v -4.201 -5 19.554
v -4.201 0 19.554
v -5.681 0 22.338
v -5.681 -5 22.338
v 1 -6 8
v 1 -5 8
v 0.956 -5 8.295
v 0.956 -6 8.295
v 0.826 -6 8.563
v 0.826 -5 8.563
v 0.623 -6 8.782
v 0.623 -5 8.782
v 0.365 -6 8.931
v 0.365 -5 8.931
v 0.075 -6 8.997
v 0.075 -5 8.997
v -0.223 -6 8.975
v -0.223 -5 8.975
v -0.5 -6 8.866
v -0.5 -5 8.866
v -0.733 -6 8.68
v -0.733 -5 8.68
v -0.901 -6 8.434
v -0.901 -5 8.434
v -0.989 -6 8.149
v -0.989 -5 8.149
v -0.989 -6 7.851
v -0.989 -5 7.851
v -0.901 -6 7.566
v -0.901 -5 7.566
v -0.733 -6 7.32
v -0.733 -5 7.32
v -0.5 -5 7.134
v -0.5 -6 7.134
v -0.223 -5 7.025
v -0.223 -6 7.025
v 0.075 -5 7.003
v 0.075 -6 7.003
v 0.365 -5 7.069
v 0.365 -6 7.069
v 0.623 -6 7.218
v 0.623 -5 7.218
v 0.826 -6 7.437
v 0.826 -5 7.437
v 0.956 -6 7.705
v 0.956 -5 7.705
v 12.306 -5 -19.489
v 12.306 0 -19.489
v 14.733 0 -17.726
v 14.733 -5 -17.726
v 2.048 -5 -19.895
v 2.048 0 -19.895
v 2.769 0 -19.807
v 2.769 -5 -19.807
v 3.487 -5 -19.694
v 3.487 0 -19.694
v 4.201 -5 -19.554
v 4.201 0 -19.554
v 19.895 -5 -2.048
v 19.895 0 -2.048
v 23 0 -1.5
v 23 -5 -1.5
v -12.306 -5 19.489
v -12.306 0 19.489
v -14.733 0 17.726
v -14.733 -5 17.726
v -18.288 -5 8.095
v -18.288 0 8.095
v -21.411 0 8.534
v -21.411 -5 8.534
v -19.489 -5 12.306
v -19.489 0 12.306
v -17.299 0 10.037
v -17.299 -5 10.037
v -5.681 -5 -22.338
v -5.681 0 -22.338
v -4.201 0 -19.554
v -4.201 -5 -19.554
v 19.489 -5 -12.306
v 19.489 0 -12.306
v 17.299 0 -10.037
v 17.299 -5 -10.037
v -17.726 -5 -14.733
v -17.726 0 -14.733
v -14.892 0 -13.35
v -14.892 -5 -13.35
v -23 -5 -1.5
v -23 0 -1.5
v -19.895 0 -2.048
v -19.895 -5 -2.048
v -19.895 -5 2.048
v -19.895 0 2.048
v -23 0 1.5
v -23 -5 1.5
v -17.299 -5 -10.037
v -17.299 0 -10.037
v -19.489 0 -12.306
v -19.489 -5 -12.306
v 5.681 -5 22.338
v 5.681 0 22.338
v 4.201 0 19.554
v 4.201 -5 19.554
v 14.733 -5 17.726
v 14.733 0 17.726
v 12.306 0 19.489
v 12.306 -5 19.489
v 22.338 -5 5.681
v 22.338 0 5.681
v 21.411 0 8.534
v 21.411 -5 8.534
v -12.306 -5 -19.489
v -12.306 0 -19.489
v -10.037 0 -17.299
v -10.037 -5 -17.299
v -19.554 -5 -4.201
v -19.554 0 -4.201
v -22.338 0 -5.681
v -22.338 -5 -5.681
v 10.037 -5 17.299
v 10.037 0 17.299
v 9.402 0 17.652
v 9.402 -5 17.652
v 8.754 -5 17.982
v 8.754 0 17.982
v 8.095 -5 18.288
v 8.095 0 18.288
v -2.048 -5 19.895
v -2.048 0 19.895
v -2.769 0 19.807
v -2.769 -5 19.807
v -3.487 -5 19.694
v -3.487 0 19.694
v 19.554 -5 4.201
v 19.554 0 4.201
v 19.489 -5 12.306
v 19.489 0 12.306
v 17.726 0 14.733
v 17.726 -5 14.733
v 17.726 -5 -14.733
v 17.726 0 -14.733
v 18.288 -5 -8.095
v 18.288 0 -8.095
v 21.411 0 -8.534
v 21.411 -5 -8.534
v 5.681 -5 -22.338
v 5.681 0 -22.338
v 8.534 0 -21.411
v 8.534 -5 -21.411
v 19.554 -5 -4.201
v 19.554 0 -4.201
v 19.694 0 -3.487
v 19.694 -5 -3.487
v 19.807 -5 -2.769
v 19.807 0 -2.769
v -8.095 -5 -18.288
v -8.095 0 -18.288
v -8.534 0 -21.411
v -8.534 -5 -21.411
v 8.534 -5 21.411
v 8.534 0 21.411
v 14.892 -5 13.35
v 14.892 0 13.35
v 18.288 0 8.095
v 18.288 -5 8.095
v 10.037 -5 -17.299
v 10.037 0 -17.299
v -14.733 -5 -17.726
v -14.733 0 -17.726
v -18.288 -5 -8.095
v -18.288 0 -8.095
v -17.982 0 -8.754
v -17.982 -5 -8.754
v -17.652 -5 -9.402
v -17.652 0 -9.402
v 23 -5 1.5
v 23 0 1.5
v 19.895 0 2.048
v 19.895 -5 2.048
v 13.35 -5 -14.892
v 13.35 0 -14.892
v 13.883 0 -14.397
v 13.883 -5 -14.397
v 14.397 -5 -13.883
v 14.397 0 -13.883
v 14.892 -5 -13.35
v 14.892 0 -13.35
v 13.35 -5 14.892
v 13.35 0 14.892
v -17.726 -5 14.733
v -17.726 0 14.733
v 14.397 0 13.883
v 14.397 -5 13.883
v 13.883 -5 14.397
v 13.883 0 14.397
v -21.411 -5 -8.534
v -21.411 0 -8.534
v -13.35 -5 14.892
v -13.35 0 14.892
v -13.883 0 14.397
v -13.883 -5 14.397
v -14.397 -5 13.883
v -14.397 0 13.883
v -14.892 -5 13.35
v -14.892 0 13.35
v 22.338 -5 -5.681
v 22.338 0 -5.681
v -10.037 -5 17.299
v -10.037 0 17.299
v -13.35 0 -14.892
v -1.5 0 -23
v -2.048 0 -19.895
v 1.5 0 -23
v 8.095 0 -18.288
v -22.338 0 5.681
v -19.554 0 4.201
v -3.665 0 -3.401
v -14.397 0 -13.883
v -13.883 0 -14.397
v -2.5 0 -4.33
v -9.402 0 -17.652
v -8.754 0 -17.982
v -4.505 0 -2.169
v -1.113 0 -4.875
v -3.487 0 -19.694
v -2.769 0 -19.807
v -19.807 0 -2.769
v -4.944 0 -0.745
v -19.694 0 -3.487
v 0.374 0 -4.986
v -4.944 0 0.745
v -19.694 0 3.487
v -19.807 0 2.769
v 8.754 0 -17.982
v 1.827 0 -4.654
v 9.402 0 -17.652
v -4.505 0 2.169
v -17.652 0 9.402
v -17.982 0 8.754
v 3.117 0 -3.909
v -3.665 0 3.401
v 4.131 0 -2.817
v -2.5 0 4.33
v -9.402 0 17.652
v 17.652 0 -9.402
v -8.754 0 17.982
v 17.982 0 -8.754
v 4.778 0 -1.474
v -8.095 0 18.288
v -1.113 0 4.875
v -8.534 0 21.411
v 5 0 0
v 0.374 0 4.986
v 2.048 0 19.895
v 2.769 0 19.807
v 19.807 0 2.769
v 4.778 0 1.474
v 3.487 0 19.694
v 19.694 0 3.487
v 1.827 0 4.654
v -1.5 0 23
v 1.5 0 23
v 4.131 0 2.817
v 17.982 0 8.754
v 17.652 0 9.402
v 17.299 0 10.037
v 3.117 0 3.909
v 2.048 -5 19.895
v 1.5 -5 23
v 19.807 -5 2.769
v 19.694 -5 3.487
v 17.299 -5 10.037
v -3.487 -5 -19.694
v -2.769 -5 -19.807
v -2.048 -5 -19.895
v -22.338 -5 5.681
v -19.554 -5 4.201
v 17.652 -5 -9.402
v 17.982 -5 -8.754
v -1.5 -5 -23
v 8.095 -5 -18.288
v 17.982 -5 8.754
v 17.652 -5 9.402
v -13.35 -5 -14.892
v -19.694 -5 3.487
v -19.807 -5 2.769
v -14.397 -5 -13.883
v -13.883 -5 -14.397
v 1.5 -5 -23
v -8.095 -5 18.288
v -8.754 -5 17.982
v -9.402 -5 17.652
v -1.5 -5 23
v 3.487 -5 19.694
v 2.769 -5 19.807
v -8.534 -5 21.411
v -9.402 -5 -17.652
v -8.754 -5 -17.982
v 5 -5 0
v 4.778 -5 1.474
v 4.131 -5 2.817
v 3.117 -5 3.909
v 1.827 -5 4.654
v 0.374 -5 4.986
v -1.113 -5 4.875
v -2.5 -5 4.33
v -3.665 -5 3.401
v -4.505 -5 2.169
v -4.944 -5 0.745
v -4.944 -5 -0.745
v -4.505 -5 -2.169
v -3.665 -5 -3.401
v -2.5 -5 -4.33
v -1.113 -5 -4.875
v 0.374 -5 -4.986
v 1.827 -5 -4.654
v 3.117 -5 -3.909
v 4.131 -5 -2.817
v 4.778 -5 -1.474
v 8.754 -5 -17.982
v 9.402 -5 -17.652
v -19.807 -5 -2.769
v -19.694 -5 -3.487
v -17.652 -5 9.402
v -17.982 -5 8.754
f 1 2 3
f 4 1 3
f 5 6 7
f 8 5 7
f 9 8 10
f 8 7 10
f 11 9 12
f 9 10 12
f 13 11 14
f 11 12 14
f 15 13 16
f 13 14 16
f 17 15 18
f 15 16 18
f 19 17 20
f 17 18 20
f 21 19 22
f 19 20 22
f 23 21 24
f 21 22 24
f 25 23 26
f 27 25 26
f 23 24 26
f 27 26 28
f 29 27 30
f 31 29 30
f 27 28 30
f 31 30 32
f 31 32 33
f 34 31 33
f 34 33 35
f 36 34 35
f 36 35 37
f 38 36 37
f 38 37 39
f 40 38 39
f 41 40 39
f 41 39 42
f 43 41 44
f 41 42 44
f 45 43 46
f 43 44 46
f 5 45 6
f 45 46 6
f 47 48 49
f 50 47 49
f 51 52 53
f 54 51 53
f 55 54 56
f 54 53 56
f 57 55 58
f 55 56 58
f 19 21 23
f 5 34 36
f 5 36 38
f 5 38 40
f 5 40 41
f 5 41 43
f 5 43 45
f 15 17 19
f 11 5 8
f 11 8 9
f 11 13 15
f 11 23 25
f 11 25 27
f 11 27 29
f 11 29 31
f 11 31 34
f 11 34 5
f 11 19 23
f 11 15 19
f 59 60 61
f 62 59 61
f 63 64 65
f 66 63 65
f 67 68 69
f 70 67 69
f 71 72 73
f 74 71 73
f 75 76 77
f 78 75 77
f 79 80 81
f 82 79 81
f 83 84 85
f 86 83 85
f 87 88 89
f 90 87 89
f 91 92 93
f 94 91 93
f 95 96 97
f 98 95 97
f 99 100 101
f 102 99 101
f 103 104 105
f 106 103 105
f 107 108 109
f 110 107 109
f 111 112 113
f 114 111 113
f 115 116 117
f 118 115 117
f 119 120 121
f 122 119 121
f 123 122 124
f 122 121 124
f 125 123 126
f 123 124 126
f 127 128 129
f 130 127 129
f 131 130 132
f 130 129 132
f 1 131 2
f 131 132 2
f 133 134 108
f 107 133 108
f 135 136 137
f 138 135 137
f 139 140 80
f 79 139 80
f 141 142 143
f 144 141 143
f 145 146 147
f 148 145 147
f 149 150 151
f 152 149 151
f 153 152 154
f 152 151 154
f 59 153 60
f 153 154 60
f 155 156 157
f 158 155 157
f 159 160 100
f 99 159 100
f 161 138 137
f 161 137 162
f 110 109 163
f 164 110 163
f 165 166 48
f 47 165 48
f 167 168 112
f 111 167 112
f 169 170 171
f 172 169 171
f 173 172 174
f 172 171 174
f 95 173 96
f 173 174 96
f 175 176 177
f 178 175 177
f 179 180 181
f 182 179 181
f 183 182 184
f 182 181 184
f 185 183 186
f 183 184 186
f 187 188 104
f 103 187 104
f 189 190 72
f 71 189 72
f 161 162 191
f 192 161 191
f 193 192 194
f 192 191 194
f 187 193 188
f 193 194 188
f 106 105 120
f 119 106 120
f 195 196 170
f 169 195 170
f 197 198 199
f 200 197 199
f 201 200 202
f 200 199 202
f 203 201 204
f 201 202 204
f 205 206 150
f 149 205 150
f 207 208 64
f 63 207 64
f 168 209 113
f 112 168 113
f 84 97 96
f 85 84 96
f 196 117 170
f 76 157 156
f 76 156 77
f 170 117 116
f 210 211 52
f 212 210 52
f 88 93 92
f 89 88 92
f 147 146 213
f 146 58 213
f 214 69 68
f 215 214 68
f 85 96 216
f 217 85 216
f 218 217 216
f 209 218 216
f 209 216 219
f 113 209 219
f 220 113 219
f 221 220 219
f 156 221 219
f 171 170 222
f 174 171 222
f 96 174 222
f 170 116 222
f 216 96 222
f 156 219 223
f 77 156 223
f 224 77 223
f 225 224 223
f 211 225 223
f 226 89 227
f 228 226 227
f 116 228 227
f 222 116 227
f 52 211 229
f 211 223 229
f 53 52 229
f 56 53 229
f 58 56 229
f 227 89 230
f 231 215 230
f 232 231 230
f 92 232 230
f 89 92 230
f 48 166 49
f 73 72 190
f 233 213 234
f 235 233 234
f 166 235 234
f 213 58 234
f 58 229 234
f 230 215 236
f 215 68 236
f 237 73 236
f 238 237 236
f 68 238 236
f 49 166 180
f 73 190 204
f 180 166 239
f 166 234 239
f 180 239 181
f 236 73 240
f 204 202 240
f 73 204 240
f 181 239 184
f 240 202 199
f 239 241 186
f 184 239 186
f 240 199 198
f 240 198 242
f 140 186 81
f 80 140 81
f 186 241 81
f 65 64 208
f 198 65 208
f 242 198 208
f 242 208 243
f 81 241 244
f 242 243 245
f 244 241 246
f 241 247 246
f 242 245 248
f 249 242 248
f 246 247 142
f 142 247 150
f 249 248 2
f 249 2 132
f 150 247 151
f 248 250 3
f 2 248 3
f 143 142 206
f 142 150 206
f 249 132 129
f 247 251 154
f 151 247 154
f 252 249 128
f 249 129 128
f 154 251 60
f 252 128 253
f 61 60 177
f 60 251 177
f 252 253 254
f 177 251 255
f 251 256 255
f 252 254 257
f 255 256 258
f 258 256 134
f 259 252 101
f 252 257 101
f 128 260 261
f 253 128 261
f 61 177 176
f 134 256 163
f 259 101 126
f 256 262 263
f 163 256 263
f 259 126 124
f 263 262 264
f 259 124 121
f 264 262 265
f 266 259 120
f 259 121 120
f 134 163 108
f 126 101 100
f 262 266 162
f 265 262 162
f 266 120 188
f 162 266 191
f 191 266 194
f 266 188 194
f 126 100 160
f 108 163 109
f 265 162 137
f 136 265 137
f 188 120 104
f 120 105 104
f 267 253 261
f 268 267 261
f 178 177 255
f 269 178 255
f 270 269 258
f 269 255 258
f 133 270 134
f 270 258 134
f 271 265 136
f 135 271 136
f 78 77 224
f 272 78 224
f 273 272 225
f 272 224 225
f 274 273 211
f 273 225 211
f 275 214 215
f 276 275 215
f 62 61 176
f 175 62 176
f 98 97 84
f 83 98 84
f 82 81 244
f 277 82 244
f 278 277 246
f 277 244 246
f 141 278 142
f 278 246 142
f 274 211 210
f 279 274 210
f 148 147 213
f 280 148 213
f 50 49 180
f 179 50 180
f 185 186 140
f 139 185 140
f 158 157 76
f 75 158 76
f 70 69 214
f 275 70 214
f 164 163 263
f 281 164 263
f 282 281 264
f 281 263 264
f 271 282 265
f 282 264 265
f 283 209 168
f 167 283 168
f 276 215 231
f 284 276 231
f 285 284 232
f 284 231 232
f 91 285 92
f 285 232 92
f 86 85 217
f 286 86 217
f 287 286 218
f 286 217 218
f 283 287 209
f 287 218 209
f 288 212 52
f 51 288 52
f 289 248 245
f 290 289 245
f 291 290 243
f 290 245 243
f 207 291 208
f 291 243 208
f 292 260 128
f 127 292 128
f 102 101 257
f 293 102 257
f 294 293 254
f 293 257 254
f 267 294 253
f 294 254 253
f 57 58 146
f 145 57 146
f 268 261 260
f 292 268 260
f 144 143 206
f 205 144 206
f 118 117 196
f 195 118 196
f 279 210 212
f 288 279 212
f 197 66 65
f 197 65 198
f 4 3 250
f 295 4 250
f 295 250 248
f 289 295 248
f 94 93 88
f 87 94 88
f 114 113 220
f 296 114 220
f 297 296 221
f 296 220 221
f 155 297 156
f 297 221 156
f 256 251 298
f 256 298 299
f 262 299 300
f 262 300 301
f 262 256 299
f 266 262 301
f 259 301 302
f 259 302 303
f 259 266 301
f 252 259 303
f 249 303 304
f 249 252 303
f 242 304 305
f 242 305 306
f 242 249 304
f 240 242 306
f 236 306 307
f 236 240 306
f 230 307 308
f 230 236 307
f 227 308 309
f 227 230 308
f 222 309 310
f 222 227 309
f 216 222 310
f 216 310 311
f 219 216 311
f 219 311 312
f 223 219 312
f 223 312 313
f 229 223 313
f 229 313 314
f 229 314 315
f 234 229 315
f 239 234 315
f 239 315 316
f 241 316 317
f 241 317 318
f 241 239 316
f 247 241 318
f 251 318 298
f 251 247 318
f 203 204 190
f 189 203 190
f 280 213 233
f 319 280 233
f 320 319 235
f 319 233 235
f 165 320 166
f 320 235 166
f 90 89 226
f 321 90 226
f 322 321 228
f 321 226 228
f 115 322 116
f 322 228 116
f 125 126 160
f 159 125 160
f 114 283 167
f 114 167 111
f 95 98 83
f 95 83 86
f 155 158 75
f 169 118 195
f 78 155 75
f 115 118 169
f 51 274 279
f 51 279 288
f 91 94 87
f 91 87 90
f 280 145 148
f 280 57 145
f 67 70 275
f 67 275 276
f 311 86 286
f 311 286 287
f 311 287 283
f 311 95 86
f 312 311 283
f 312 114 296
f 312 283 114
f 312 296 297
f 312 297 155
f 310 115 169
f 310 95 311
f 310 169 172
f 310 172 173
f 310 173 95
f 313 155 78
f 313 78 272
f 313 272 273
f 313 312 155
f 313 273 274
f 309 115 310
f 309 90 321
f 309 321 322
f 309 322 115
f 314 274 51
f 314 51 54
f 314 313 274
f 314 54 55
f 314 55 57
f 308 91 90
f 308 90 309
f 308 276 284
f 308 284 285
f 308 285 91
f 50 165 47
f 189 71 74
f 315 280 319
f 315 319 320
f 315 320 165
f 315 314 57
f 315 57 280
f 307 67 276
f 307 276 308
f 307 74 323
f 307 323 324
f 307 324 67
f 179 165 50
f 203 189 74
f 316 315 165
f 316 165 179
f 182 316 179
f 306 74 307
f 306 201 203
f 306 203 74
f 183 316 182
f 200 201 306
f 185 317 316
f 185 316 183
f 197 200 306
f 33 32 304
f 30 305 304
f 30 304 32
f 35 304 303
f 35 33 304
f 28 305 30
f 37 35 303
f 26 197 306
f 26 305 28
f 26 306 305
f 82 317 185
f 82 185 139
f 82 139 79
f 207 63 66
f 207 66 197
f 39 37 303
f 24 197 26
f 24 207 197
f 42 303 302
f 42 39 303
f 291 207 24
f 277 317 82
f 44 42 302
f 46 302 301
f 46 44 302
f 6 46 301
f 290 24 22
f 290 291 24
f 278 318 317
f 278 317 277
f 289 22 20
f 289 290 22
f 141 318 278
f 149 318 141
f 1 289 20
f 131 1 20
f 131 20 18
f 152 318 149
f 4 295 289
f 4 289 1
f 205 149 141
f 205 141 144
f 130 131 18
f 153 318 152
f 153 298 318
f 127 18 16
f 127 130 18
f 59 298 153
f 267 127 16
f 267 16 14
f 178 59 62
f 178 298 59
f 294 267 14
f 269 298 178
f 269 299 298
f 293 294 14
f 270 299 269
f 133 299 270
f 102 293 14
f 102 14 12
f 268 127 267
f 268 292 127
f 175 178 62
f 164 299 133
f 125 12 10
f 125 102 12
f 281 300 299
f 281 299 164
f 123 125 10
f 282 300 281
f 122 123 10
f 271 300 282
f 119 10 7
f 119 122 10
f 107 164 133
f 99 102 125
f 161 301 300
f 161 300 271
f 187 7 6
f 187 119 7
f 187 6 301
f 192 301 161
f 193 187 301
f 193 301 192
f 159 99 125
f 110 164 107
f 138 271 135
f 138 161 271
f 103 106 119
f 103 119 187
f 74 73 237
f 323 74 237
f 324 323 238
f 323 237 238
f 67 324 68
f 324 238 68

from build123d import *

# Parameters (mm, degrees)
F0_R     = 5
F1_DEPTH = 5
F2_R     = 1
F3_DEPTH = 1


with BuildPart() as f1:
    # F0 (on Front) → F1 (new body)
    with BuildSketch(Plane.XZ):
        with BuildLine():
            ThreePointArc((19.894917, -2.04751), (19.973712, -1.025102), (20, 0))
            ThreePointArc((20, 0), (19.973712, 1.025102), (19.894917, 2.04751))
            ThreePointArc((19.894917, 2.04751), (19.753767, 3.128689), (19.553905, 4.20057))
            ThreePointArc((19.553905, 4.20057), (19.02113, 6.18034), (18.288475, 8.095165))
            ThreePointArc((18.288475, 8.095165), (17.82013, 9.07981), (17.298822, 10.037468))
            ThreePointArc((17.298822, 10.037468), (16.18034, 11.755705), (14.891829, 13.350409))
            ThreePointArc((14.891829, 13.350409), (14.142136, 14.142136), (13.350409, 14.891829))
            ThreePointArc((13.350409, 14.891829), (11.755705, 16.18034), (10.037468, 17.298822))
            ThreePointArc((10.037468, 17.298822), (9.07981, 17.82013), (8.095165, 18.288475))
            ThreePointArc((8.095165, 18.288475), (6.18034, 19.02113), (4.20057, 19.553905))
            ThreePointArc((4.20057, 19.553905), (3.128689, 19.753767), (2.04751, 19.894917))
            ThreePointArc((2.04751, 19.894917), (0, 20), (-2.04751, 19.894917))
            ThreePointArc((-2.04751, 19.894917), (-3.128689, 19.753767), (-4.20057, 19.553905))
            ThreePointArc((-4.20057, 19.553905), (-6.18034, 19.02113), (-8.095165, 18.288475))
            ThreePointArc((-8.095165, 18.288475), (-9.07981, 17.82013), (-10.037468, 17.298822))
            ThreePointArc((-10.037468, 17.298822), (-11.755705, 16.18034), (-13.350409, 14.891829))
            ThreePointArc((-13.350409, 14.891829), (-14.142136, 14.142136), (-14.891829, 13.350409))
            ThreePointArc((-14.891829, 13.350409), (-16.18034, 11.755705), (-17.298822, 10.037468))
            ThreePointArc((-17.298822, 10.037468), (-17.82013, 9.07981), (-18.288475, 8.095165))
            ThreePointArc((-18.288475, 8.095165), (-19.02113, 6.18034), (-19.553905, 4.20057))
            ThreePointArc((-19.553905, 4.20057), (-19.753767, 3.128689), (-19.894917, 2.04751))
            ThreePointArc((-19.894917, 2.04751), (-20, 0), (-19.894917, -2.04751))
            ThreePointArc((-19.894917, -2.04751), (-19.753767, -3.128689), (-19.553905, -4.20057))
            ThreePointArc((-19.553905, -4.20057), (-19.02113, -6.18034), (-18.288475, -8.095165))
            ThreePointArc((-18.288475, -8.095165), (-17.82013, -9.07981), (-17.298822, -10.037468))
            ThreePointArc((-17.298822, -10.037468), (-16.18034, -11.755705), (-14.891829, -13.350409))
            ThreePointArc((-14.891829, -13.350409), (-14.142136, -14.142136), (-13.350409, -14.891829))
            ThreePointArc((-13.350409, -14.891829), (-11.755705, -16.18034), (-10.037468, -17.298822))
            ThreePointArc((-10.037468, -17.298822), (-9.07981, -17.82013), (-8.095165, -18.288475))
            ThreePointArc((-8.095165, -18.288475), (-6.18034, -19.02113), (-4.20057, -19.553905))
            ThreePointArc((-4.20057, -19.553905), (-3.128689, -19.753767), (-2.04751, -19.894917))
            ThreePointArc((-2.04751, -19.894917), (0, -20), (2.04751, -19.894917))
            ThreePointArc((2.04751, -19.894917), (3.128689, -19.753767), (4.20057, -19.553905))
            ThreePointArc((4.20057, -19.553905), (6.18034, -19.02113), (8.095165, -18.288475))
            ThreePointArc((8.095165, -18.288475), (9.07981, -17.82013), (10.037468, -17.298822))
            ThreePointArc((10.037468, -17.298822), (11.755705, -16.18034), (13.350409, -14.891829))
            ThreePointArc((13.350409, -14.891829), (14.142136, -14.142136), (14.891829, -13.350409))
            ThreePointArc((14.891829, -13.350409), (16.18034, -11.755705), (17.298822, -10.037468))
            ThreePointArc((17.298822, -10.037468), (17.82013, -9.07981), (18.288475, -8.095165))
            ThreePointArc((18.288475, -8.095165), (19.02113, -6.18034), (19.553905, -4.20057))
            ThreePointArc((19.553905, -4.20057), (19.753767, -3.128689), (19.894917, -2.04751))
        make_face()
        Circle(F0_R, mode=Mode.SUBTRACT)
        with BuildLine():
            ThreePointArc((19.894917, 2.04751), (19.973712, 1.025102), (20, 0))
            ThreePointArc((20, 0), (19.973712, -1.025102), (19.894917, -2.04751))
            Line((19.894917, -2.04751), (23, -1.5))
            Line((23, -1.5), (23, 1.5))
            Line((23, 1.5), (19.894917, 2.04751))
        make_face()
        with BuildLine():
            ThreePointArc((18.288475, 8.095165), (19.02113, 6.18034), (19.553905, 4.20057))
            Line((19.553905, 4.20057), (22.337825, 5.680806))
            Line((22.337825, 5.680806), (21.410774, 8.533976))
            Line((21.410774, 8.533976), (18.288475, 8.095165))
        make_face()
        with BuildLine():
            Line((22.337825, -5.680806), (19.553905, -4.20057))
            ThreePointArc((19.553905, -4.20057), (19.02113, -6.18034), (18.288475, -8.095165))
            Line((18.288475, -8.095165), (21.410774, -8.533976))
            Line((21.410774, -8.533976), (22.337825, -5.680806))
        make_face()
        with BuildLine():
            ThreePointArc((14.891829, 13.350409), (16.18034, 11.755705), (17.298822, 10.037468))
            Line((17.298822, 10.037468), (19.489069, 12.305535))
            Line((19.489069, 12.305535), (17.725713, 14.732586))
            Line((17.725713, 14.732586), (14.891829, 13.350409))
        make_face()
        with BuildLine():
            Line((19.489069, -12.305535), (17.298822, -10.037468))
            ThreePointArc((17.298822, -10.037468), (16.18034, -11.755705), (14.891829, -13.350409))
            Line((14.891829, -13.350409), (17.725713, -14.732586))
            Line((17.725713, -14.732586), (19.489069, -12.305535))
        make_face()
        with BuildLine():
            ThreePointArc((10.037468, 17.298822), (11.755705, 16.18034), (13.350409, 14.891829))
            Line((13.350409, 14.891829), (14.732586, 17.725713))
            Line((14.732586, 17.725713), (12.305535, 19.489069))
            Line((12.305535, 19.489069), (10.037468, 17.298822))
        make_face()
        with BuildLine():
            Line((14.732586, -17.725713), (13.350409, -14.891829))
            ThreePointArc((13.350409, -14.891829), (11.755705, -16.18034), (10.037468, -17.298822))
            Line((10.037468, -17.298822), (12.305535, -19.489069))
            Line((12.305535, -19.489069), (14.732586, -17.725713))
        make_face()
        with BuildLine():
            ThreePointArc((4.20057, 19.553905), (6.18034, 19.02113), (8.095165, 18.288475))
            Line((8.095165, 18.288475), (8.533976, 21.410774))
            Line((8.533976, 21.410774), (5.680806, 22.337825))
            Line((5.680806, 22.337825), (4.20057, 19.553905))
        make_face()
        with BuildLine():
            Line((8.533976, -21.410774), (8.095165, -18.288475))
            ThreePointArc((8.095165, -18.288475), (6.18034, -19.02113), (4.20057, -19.553905))
            Line((4.20057, -19.553905), (5.680806, -22.337825))
            Line((5.680806, -22.337825), (8.533976, -21.410774))
        make_face()
        with BuildLine():
            ThreePointArc((-2.04751, 19.894917), (0, 20), (2.04751, 19.894917))
            Line((2.04751, 19.894917), (1.5, 23))
            Line((1.5, 23), (-1.5, 23))
            Line((-1.5, 23), (-2.04751, 19.894917))
        make_face()
        with BuildLine():
            Line((1.5, -23), (2.04751, -19.894917))
            ThreePointArc((2.04751, -19.894917), (0, -20), (-2.04751, -19.894917))
            Line((-2.04751, -19.894917), (-1.5, -23))
            Line((-1.5, -23), (1.5, -23))
        make_face()
        with BuildLine():
            ThreePointArc((-8.095165, 18.288475), (-6.18034, 19.02113), (-4.20057, 19.553905))
            Line((-4.20057, 19.553905), (-5.680806, 22.337825))
            Line((-5.680806, 22.337825), (-8.533976, 21.410774))
            Line((-8.533976, 21.410774), (-8.095165, 18.288475))
        make_face()
        with BuildLine():
            Line((-5.680806, -22.337825), (-4.20057, -19.553905))
            ThreePointArc((-4.20057, -19.553905), (-6.18034, -19.02113), (-8.095165, -18.288475))
            Line((-8.095165, -18.288475), (-8.533976, -21.410774))
            Line((-8.533976, -21.410774), (-5.680806, -22.337825))
        make_face()
        with BuildLine():
            ThreePointArc((-13.350409, 14.891829), (-11.755705, 16.18034), (-10.037468, 17.298822))
            Line((-10.037468, 17.298822), (-12.305535, 19.489069))
            Line((-12.305535, 19.489069), (-14.732586, 17.725713))
            Line((-14.732586, 17.725713), (-13.350409, 14.891829))
        make_face()
        with BuildLine():
            Line((-12.305535, -19.489069), (-10.037468, -17.298822))
            ThreePointArc((-10.037468, -17.298822), (-11.755705, -16.18034), (-13.350409, -14.891829))
            Line((-13.350409, -14.891829), (-14.732586, -17.725713))
            Line((-14.732586, -17.725713), (-12.305535, -19.489069))
        make_face()
        with BuildLine():
            ThreePointArc((-17.298822, 10.037468), (-16.18034, 11.755705), (-14.891829, 13.350409))
            Line((-14.891829, 13.350409), (-17.725713, 14.732586))
            Line((-17.725713, 14.732586), (-19.489069, 12.305535))
            Line((-19.489069, 12.305535), (-17.298822, 10.037468))
        make_face()
        with BuildLine():
            Line((-17.725713, -14.732586), (-14.891829, -13.350409))
            ThreePointArc((-14.891829, -13.350409), (-16.18034, -11.755705), (-17.298822, -10.037468))
            Line((-17.298822, -10.037468), (-19.489069, -12.305535))
            Line((-19.489069, -12.305535), (-17.725713, -14.732586))
        make_face()
        with BuildLine():
            ThreePointArc((-19.553905, 4.20057), (-19.02113, 6.18034), (-18.288475, 8.095165))
            Line((-18.288475, 8.095165), (-21.410774, 8.533976))
            Line((-21.410774, 8.533976), (-22.337825, 5.680806))
            Line((-22.337825, 5.680806), (-19.553905, 4.20057))
        make_face()
        with BuildLine():
            Line((-21.410774, -8.533976), (-18.288475, -8.095165))
            ThreePointArc((-18.288475, -8.095165), (-19.02113, -6.18034), (-19.553905, -4.20057))
            Line((-19.553905, -4.20057), (-22.337825, -5.680806))
            Line((-22.337825, -5.680806), (-21.410774, -8.533976))
        make_face()
        with BuildLine():
            ThreePointArc((-19.894917, -2.04751), (-20, 0), (-19.894917, 2.04751))
            Line((-19.894917, 2.04751), (-23, 1.5))
            Line((-23, 1.5), (-23, -1.5))
            Line((-23, -1.5), (-19.894917, -2.04751))
        make_face()
    extrude(amount=F1_DEPTH)

    # F2 (on face) → F3 (join)
    with BuildSketch(Plane.XZ.offset(5)):
        with Locations((0, 8)):
            Circle(F2_R)
    extrude(amount=F3_DEPTH)


solid = f1.part
